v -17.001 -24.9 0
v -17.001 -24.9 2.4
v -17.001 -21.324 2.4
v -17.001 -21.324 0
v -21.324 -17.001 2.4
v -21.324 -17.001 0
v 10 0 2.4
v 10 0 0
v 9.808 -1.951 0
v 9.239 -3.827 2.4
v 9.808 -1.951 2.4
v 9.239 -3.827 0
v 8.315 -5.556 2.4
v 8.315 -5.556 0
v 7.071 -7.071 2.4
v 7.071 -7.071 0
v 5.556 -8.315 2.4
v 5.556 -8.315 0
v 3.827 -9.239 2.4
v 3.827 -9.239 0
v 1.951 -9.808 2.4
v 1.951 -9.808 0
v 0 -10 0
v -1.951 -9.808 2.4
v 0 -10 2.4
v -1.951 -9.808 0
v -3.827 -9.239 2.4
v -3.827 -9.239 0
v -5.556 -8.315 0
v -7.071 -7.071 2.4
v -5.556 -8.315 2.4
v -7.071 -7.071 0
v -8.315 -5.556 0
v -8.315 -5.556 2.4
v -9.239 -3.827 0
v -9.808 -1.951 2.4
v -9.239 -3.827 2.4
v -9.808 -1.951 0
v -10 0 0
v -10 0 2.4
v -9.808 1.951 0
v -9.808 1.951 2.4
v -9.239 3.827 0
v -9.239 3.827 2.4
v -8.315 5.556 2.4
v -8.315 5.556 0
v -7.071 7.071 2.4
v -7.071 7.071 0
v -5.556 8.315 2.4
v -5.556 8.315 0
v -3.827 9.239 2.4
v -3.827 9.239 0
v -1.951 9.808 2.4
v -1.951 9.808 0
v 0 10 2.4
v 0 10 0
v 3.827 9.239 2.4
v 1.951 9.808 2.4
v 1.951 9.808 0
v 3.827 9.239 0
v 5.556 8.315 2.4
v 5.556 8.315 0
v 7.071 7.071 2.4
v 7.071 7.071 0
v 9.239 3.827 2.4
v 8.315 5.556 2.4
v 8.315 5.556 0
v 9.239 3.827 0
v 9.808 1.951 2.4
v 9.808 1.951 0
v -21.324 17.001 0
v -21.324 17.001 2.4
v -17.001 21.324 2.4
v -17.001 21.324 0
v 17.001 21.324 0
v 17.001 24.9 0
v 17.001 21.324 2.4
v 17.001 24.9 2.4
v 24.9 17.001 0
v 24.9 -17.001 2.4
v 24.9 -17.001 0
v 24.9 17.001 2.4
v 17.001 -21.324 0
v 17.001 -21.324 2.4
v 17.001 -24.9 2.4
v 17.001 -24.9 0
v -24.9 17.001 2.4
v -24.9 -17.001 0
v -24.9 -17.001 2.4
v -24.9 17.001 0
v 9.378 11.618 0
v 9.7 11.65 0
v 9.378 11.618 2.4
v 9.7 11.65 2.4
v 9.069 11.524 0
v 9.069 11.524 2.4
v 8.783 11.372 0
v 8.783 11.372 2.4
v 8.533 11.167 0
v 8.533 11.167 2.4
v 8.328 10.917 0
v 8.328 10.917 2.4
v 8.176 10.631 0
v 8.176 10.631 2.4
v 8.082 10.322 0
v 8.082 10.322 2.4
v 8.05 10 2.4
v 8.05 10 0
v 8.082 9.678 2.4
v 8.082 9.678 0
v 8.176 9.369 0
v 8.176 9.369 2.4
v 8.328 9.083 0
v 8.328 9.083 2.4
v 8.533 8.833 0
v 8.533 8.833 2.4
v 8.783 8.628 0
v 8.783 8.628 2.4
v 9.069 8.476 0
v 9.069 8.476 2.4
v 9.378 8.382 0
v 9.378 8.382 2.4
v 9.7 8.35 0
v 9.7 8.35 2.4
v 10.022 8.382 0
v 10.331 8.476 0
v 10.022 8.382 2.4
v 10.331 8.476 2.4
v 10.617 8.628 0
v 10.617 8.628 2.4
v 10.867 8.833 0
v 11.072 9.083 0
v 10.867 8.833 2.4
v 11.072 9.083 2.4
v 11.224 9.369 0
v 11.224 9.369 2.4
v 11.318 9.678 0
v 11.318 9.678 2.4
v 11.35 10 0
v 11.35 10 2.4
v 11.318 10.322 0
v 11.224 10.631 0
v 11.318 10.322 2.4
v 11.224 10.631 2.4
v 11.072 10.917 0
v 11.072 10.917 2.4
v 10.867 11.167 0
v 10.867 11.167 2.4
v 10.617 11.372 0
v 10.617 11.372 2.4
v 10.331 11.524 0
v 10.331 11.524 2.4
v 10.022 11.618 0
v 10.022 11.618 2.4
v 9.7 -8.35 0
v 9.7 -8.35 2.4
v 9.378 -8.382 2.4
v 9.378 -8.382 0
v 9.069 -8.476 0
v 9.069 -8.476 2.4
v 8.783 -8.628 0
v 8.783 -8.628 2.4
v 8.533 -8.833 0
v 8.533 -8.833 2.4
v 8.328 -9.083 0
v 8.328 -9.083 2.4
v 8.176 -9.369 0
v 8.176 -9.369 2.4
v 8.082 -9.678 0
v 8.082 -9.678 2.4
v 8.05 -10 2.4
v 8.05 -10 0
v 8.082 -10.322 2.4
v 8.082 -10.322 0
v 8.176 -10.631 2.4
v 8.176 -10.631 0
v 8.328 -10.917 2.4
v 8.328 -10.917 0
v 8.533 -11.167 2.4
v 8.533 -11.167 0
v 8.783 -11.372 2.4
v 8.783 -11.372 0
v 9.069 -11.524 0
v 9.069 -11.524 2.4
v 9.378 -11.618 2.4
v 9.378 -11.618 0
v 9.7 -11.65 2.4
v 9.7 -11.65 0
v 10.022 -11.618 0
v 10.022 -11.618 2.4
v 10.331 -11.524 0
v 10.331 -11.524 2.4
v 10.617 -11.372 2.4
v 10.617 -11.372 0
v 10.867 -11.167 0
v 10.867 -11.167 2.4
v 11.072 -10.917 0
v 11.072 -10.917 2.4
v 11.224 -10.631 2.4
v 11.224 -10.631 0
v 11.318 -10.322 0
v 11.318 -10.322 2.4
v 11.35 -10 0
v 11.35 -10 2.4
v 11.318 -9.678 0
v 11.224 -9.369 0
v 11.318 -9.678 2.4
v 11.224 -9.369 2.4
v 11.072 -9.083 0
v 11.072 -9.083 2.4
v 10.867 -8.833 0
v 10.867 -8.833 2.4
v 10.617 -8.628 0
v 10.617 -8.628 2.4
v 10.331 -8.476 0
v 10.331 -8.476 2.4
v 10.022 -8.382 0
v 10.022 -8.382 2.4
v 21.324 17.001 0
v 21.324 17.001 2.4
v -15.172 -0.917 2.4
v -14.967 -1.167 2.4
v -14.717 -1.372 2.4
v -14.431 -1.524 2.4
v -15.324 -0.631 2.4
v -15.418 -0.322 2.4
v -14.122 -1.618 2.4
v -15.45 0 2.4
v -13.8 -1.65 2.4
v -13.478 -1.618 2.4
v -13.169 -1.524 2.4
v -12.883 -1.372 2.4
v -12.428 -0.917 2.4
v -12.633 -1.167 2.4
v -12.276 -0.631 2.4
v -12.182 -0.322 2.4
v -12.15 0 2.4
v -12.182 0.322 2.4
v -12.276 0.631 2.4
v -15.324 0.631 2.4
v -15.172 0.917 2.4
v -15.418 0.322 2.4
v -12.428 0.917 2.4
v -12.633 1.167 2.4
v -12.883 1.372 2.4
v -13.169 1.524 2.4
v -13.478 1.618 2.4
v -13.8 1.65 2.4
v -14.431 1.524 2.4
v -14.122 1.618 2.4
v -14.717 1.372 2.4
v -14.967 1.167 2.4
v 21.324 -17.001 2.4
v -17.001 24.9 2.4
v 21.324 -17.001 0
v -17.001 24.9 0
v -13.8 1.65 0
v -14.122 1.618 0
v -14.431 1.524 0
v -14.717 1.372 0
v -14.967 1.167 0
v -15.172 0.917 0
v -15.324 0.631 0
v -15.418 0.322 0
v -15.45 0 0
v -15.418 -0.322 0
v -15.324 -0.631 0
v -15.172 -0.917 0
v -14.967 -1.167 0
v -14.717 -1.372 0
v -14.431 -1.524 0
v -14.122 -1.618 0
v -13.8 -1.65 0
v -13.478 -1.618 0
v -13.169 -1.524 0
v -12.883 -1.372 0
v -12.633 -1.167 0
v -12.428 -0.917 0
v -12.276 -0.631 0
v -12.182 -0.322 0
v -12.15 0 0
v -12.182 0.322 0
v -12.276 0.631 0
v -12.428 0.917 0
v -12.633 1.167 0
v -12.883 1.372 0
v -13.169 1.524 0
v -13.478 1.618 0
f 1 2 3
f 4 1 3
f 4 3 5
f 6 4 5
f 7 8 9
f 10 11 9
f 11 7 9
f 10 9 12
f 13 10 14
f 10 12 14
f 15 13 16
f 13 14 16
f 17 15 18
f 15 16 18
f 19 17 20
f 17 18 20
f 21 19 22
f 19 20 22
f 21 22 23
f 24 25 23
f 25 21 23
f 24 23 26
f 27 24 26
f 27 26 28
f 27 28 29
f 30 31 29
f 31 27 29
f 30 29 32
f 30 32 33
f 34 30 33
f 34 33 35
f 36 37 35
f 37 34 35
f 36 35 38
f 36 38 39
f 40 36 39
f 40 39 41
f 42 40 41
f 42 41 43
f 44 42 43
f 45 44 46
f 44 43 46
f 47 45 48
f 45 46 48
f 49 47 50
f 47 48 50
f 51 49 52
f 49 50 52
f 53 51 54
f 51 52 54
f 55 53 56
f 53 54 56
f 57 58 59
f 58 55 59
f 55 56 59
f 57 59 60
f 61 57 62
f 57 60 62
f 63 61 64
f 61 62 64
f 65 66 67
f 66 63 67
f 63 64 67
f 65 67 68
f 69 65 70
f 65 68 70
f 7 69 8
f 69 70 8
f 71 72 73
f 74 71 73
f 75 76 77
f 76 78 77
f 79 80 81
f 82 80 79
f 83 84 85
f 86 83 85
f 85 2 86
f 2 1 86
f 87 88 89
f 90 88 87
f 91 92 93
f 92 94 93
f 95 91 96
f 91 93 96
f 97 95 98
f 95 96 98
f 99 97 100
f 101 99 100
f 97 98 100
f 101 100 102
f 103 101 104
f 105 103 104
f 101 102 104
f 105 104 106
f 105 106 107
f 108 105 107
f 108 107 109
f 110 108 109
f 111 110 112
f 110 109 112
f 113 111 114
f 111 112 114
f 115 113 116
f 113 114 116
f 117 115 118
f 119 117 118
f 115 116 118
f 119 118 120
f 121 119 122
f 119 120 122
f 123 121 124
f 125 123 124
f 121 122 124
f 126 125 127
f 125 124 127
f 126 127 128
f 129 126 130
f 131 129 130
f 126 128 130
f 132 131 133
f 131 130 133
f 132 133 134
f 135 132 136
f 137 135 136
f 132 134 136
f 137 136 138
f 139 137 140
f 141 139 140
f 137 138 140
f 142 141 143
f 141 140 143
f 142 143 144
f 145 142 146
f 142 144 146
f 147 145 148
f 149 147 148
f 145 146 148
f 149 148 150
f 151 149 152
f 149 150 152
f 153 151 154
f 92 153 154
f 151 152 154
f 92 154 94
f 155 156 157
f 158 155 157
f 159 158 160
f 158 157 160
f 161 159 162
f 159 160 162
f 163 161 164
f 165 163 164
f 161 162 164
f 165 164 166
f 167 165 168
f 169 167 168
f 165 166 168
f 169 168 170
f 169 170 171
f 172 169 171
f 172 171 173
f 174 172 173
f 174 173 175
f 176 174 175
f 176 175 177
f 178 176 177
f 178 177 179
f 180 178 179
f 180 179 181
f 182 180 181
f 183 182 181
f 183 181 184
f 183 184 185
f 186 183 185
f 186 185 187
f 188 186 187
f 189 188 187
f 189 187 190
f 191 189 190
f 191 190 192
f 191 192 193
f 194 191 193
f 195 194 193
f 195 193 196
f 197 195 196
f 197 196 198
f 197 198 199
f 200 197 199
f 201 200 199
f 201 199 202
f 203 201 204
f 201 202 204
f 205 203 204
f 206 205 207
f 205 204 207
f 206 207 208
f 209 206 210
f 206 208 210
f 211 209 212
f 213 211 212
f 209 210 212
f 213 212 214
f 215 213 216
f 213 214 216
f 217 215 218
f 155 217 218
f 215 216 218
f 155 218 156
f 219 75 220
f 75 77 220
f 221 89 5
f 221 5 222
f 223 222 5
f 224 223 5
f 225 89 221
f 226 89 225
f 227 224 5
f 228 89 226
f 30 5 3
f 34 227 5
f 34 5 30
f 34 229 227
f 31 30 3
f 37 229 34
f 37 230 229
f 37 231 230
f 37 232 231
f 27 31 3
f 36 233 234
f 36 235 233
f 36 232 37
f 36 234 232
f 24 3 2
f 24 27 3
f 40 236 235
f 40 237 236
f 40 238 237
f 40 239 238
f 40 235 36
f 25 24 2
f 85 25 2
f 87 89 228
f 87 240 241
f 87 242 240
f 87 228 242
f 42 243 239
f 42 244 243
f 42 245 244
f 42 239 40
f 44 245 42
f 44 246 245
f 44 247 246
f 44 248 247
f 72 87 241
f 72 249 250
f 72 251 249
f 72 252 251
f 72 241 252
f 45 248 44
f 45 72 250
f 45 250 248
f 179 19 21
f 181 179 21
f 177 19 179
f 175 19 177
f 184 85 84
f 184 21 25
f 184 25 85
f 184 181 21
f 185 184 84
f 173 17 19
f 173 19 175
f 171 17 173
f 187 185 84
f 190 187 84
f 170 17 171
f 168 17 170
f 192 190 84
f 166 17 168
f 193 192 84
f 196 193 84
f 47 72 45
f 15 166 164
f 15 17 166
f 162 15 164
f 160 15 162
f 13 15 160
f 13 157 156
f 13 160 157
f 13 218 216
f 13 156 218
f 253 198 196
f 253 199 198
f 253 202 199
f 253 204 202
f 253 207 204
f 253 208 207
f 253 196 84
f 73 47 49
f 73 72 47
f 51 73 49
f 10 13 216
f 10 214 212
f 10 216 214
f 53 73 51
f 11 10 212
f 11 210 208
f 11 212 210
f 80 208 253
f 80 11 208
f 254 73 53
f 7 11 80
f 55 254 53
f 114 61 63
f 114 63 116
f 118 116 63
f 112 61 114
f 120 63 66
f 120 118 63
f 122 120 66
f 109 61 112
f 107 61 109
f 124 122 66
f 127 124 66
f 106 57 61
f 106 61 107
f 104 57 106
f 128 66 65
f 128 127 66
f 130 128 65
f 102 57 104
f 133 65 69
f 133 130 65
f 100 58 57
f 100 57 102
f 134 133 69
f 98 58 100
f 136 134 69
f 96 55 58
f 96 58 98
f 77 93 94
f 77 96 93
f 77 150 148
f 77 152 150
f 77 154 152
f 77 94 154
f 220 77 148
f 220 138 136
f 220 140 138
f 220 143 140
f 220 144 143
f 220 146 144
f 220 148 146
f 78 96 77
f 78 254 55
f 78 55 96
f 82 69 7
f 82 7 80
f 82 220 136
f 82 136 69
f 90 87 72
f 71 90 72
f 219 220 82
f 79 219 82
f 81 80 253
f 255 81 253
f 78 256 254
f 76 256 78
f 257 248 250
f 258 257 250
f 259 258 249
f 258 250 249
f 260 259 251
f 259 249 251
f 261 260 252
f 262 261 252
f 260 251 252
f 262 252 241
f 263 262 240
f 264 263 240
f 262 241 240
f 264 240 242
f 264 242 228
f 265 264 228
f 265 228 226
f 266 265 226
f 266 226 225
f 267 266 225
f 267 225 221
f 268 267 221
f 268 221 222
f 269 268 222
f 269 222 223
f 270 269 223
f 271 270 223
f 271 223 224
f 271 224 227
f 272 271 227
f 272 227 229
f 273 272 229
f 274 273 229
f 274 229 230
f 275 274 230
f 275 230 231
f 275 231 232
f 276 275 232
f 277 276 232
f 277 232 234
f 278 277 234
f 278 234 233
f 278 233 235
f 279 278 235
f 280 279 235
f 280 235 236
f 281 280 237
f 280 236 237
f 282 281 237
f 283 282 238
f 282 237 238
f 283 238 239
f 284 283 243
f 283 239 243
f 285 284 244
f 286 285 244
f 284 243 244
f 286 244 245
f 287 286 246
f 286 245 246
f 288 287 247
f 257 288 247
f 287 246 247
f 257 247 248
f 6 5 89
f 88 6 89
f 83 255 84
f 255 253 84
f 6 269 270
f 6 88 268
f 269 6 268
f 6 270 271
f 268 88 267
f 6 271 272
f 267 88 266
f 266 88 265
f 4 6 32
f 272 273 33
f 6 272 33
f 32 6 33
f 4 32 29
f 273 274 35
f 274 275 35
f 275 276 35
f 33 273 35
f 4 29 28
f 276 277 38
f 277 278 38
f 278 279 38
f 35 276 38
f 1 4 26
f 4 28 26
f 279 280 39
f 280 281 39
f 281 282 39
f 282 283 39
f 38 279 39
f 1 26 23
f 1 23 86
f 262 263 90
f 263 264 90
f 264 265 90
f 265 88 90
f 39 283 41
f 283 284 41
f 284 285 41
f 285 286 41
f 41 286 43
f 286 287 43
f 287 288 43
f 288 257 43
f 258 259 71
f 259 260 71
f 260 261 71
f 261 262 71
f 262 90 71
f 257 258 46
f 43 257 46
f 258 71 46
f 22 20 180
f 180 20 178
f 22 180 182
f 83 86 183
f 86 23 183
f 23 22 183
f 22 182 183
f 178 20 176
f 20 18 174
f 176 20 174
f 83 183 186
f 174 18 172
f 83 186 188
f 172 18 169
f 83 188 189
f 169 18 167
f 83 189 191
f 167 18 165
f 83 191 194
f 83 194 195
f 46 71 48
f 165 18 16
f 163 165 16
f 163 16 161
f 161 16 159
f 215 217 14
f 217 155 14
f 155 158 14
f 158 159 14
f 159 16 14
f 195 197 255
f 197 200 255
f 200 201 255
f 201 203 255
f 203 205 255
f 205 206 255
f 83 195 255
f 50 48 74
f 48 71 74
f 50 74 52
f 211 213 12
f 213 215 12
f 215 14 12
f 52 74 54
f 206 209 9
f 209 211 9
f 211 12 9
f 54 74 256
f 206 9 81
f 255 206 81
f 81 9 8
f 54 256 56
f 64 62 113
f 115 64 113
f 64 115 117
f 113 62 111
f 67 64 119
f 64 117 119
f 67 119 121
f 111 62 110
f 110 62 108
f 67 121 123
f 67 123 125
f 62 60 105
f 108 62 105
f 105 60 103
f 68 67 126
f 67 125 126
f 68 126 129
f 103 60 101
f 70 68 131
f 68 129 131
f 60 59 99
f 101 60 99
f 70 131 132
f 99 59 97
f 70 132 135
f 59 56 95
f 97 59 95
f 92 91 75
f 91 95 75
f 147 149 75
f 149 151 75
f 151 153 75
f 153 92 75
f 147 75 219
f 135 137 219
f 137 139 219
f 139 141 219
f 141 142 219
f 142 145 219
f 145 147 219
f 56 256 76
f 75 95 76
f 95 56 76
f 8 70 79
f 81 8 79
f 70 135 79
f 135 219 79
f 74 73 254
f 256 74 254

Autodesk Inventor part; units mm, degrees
ref_plane "YZ Plane" through (0, 0, 0) normal (1, 0, 0) x (0, 1, 0)
ref_plane "XZ Plane" through (0, 0, 0) normal (0, 1, 0) x (-1, 0, 0)
ref_plane "Work Plane1" through (-29.1, -14.5, 2.4) normal (0, 0, -1) x (0, 1, 0)
sketch "Sketch1" plane through (0, 0, 0) normal (0, 0, 1) x (1, 0, 0)
  line L0 (-34.86, 0) -> (34.86, 0) construction
  line L1 (0, -34.86) -> (0, 34.86) construction
  line L2 (0, 0) -> (11.1575, 11.1575) construction
  line L3 (0, 0) -> (15.7791, 0) construction
  line L4 (0, 24.9) -> (16.8009, 24.9)
  line L5 (16.8009, 24.9) -> (16.8009, 21.2415)
  line L6 (16.8009, 21.2415) -> (19.0212, 19.0212)
  line L7 (24.9, 0) -> (24.9, 16.8009)
  line L8 (24.9, 16.8009) -> (21.2415, 16.8009)
  line L9 (21.2415, 16.8009) -> (19.0212, 19.0212)
  line L10 (0, -24.9) -> (16.8009, -24.9)
  line L11 (16.8009, -24.9) -> (16.8009, -21.2415)
  line L12 (16.8009, -21.2415) -> (19.0212, -19.0212)
  line L13 (24.9, 0) -> (24.9, -16.8009)
  line L14 (24.9, -16.8009) -> (21.2415, -16.8009)
  line L15 (21.2415, -16.8009) -> (19.0212, -19.0212)
  line L16 (0, 24.9) -> (-16.8009, 24.9)
  line L17 (-16.8009, 24.9) -> (-16.8009, 21.2415)
  line L18 (-16.8009, 21.2415) -> (-19.0212, 19.0212)
  line L19 (-24.9, 16.8009) -> (-21.2415, 16.8009)
  line L20 (-21.2415, 16.8009) -> (-19.0212, 19.0212)
  line L21 (0, -24.9) -> (-16.8009, -24.9)
  line L22 (-16.8009, -24.9) -> (-16.8009, -21.2415)
  line L23 (-16.8009, -21.2415) -> (-19.0212, -19.0212)
  line L24 (-21.2415, -16.8009) -> (-19.0212, -19.0212)
  line L25 (-24.9, -16.8009) -> (-21.2415, -16.8009)
  line L26 (-24.9, 0) -> (-24.9, -16.8009)
  line L27 (-24.9, 0) -> (-24.9, 16.8009)
  circle A0 centre (0, 0) radius 10
  dimension "d0" = 45
  dimension "d2" = 24.9
  dimension "d3" = 3.14
  dimension "d4" = 26.9
  dimension "d5" = 20
extrude "Extrusion1" add sketch "Sketch1" along normal up to surface (2.4 mm away)
sketch "Sketch5" plane through (0, 0, 0) normal (0, 0, -1) x (-1, 0, 0)
  circle A0 centre (-9.7, 10) radius 1.4
  circle A1 centre (-9.7, -10) radius 1.4
  circle A2 centre (13.8, 0) radius 1.4
  point P0 (0, 0)
hole "Hole1" at (9.7, 10, 0) at (-13.8, 0, 0) at (9.7, -10, 0) direction (0, 0, 1) diameter 3.3 depth 12 tip angle 118
sketch "Skizze6" plane through (-16.8009, 24.9, 2.4) normal (0, 0, 1) x (1, 0, 0)
  circle A0 centre (3.0009, -24.9) radius 1.65 construction
  circle A1 centre (26.5009, -14.9) radius 1.65 construction
  circle A2 centre (26.5009, -34.9) radius 1.65 construction
  circle A3 centre (16.8009, -24.9) radius 10 construction
  line L0 (33.6017, -3.6585) -> (33.6017, 0) projected
  line L1 (33.6017, 0) -> (0, 0) construction
  line L2 (0, 0) -> (0, -3.6585) projected
  line L3 (0, -3.6585) -> (-4.4406, -8.0991) projected
  line L4 (-4.4406, -8.0991) -> (-8.0991, -8.0991) projected
  line L5 (-8.0991, -8.0991) -> (-8.0991, -41.7009) construction
  line L6 (-8.0991, -41.7009) -> (-4.4406, -41.7009) projected
  line L7 (-4.4406, -41.7009) -> (0, -46.1415) projected
  line L8 (0, -46.1415) -> (0, -49.8) projected
  line L9 (0, -49.8) -> (33.6017, -49.8) construction
  line L10 (33.6017, -49.8) -> (33.6017, -46.1415) projected
  line L11 (33.6017, -46.1415) -> (38.0423, -41.7009) projected
  line L12 (38.0423, -41.7009) -> (41.7009, -41.7009) projected
  line L13 (41.7009, -41.7009) -> (41.7009, -8.0991) construction
  line L14 (41.7009, -8.0991) -> (38.0423, -8.0991) projected
  line L15 (38.0423, -8.0991) -> (33.6017, -3.6585) projected
  line L16 (-0.2, 0.2) -> (33.8017, 0.2) construction
  line L17 (33.8017, 0.2) -> (33.8017, -3.5757)
  line L18 (33.8017, -3.5757) -> (38.1252, -7.8991)
  line L19 (38.1252, -7.8991) -> (41.9009, -7.8991)
  line L20 (41.9009, -7.8991) -> (41.9009, -41.9009) construction
  line L21 (41.9009, -41.9009) -> (38.1252, -41.9009)
  line L22 (38.1252, -41.9009) -> (33.8017, -46.2243)
  line L23 (33.8017, -46.2243) -> (33.8017, -50)
  line L24 (33.8017, -50) -> (-0.2, -50) construction
  line L25 (-0.2, -50) -> (-0.2, -46.2243)
  line L26 (-0.2, -46.2243) -> (-4.5235, -41.9009)
  line L27 (-4.5235, -41.9009) -> (-8.2991, -41.9009)
  line L28 (-8.2991, -41.9009) -> (-8.2991, -7.8991) construction
  line L29 (-8.2991, -7.8991) -> (-4.5235, -7.8991)
  line L30 (-4.5235, -7.8991) -> (-0.2, -3.5757)
  line L31 (-0.2, -3.5757) -> (-0.2, 0.2)
  line L32 (-8.0991, -8.0991) -> (-8.0991, -7.8991)
  line L33 (0, -3.6585) -> (0, 0) projected
  line L34 (0, 0) -> (-0.2, 0)
  line L35 (33.6017, 0) -> (33.6017, -3.6585) projected
  line L36 (33.6017, 0) -> (33.8017, 0)
  line L37 (41.7009, -8.0991) -> (41.7009, -7.8991)
  line L38 (41.7009, -41.7009) -> (41.7009, -8.0991) projected
  line L39 (41.7009, -41.7009) -> (41.7009, -41.9009)
  line L40 (33.6017, -49.8) -> (0, -49.8) projected
  line L41 (33.6017, -49.8) -> (33.8017, -49.8)
  line L42 (0, -49.8) -> (-0.2, -49.8)
  line L43 (-8.0991, -41.7009) -> (-8.0991, -41.9009)
  dimension "d25" = 0.2
extrude "IM_offset" add sketch "Skizze6" against normal up to surface (2.4 mm away)
properties part number "20_Cube_insert_Basler_acA1920_25gm_v3"
